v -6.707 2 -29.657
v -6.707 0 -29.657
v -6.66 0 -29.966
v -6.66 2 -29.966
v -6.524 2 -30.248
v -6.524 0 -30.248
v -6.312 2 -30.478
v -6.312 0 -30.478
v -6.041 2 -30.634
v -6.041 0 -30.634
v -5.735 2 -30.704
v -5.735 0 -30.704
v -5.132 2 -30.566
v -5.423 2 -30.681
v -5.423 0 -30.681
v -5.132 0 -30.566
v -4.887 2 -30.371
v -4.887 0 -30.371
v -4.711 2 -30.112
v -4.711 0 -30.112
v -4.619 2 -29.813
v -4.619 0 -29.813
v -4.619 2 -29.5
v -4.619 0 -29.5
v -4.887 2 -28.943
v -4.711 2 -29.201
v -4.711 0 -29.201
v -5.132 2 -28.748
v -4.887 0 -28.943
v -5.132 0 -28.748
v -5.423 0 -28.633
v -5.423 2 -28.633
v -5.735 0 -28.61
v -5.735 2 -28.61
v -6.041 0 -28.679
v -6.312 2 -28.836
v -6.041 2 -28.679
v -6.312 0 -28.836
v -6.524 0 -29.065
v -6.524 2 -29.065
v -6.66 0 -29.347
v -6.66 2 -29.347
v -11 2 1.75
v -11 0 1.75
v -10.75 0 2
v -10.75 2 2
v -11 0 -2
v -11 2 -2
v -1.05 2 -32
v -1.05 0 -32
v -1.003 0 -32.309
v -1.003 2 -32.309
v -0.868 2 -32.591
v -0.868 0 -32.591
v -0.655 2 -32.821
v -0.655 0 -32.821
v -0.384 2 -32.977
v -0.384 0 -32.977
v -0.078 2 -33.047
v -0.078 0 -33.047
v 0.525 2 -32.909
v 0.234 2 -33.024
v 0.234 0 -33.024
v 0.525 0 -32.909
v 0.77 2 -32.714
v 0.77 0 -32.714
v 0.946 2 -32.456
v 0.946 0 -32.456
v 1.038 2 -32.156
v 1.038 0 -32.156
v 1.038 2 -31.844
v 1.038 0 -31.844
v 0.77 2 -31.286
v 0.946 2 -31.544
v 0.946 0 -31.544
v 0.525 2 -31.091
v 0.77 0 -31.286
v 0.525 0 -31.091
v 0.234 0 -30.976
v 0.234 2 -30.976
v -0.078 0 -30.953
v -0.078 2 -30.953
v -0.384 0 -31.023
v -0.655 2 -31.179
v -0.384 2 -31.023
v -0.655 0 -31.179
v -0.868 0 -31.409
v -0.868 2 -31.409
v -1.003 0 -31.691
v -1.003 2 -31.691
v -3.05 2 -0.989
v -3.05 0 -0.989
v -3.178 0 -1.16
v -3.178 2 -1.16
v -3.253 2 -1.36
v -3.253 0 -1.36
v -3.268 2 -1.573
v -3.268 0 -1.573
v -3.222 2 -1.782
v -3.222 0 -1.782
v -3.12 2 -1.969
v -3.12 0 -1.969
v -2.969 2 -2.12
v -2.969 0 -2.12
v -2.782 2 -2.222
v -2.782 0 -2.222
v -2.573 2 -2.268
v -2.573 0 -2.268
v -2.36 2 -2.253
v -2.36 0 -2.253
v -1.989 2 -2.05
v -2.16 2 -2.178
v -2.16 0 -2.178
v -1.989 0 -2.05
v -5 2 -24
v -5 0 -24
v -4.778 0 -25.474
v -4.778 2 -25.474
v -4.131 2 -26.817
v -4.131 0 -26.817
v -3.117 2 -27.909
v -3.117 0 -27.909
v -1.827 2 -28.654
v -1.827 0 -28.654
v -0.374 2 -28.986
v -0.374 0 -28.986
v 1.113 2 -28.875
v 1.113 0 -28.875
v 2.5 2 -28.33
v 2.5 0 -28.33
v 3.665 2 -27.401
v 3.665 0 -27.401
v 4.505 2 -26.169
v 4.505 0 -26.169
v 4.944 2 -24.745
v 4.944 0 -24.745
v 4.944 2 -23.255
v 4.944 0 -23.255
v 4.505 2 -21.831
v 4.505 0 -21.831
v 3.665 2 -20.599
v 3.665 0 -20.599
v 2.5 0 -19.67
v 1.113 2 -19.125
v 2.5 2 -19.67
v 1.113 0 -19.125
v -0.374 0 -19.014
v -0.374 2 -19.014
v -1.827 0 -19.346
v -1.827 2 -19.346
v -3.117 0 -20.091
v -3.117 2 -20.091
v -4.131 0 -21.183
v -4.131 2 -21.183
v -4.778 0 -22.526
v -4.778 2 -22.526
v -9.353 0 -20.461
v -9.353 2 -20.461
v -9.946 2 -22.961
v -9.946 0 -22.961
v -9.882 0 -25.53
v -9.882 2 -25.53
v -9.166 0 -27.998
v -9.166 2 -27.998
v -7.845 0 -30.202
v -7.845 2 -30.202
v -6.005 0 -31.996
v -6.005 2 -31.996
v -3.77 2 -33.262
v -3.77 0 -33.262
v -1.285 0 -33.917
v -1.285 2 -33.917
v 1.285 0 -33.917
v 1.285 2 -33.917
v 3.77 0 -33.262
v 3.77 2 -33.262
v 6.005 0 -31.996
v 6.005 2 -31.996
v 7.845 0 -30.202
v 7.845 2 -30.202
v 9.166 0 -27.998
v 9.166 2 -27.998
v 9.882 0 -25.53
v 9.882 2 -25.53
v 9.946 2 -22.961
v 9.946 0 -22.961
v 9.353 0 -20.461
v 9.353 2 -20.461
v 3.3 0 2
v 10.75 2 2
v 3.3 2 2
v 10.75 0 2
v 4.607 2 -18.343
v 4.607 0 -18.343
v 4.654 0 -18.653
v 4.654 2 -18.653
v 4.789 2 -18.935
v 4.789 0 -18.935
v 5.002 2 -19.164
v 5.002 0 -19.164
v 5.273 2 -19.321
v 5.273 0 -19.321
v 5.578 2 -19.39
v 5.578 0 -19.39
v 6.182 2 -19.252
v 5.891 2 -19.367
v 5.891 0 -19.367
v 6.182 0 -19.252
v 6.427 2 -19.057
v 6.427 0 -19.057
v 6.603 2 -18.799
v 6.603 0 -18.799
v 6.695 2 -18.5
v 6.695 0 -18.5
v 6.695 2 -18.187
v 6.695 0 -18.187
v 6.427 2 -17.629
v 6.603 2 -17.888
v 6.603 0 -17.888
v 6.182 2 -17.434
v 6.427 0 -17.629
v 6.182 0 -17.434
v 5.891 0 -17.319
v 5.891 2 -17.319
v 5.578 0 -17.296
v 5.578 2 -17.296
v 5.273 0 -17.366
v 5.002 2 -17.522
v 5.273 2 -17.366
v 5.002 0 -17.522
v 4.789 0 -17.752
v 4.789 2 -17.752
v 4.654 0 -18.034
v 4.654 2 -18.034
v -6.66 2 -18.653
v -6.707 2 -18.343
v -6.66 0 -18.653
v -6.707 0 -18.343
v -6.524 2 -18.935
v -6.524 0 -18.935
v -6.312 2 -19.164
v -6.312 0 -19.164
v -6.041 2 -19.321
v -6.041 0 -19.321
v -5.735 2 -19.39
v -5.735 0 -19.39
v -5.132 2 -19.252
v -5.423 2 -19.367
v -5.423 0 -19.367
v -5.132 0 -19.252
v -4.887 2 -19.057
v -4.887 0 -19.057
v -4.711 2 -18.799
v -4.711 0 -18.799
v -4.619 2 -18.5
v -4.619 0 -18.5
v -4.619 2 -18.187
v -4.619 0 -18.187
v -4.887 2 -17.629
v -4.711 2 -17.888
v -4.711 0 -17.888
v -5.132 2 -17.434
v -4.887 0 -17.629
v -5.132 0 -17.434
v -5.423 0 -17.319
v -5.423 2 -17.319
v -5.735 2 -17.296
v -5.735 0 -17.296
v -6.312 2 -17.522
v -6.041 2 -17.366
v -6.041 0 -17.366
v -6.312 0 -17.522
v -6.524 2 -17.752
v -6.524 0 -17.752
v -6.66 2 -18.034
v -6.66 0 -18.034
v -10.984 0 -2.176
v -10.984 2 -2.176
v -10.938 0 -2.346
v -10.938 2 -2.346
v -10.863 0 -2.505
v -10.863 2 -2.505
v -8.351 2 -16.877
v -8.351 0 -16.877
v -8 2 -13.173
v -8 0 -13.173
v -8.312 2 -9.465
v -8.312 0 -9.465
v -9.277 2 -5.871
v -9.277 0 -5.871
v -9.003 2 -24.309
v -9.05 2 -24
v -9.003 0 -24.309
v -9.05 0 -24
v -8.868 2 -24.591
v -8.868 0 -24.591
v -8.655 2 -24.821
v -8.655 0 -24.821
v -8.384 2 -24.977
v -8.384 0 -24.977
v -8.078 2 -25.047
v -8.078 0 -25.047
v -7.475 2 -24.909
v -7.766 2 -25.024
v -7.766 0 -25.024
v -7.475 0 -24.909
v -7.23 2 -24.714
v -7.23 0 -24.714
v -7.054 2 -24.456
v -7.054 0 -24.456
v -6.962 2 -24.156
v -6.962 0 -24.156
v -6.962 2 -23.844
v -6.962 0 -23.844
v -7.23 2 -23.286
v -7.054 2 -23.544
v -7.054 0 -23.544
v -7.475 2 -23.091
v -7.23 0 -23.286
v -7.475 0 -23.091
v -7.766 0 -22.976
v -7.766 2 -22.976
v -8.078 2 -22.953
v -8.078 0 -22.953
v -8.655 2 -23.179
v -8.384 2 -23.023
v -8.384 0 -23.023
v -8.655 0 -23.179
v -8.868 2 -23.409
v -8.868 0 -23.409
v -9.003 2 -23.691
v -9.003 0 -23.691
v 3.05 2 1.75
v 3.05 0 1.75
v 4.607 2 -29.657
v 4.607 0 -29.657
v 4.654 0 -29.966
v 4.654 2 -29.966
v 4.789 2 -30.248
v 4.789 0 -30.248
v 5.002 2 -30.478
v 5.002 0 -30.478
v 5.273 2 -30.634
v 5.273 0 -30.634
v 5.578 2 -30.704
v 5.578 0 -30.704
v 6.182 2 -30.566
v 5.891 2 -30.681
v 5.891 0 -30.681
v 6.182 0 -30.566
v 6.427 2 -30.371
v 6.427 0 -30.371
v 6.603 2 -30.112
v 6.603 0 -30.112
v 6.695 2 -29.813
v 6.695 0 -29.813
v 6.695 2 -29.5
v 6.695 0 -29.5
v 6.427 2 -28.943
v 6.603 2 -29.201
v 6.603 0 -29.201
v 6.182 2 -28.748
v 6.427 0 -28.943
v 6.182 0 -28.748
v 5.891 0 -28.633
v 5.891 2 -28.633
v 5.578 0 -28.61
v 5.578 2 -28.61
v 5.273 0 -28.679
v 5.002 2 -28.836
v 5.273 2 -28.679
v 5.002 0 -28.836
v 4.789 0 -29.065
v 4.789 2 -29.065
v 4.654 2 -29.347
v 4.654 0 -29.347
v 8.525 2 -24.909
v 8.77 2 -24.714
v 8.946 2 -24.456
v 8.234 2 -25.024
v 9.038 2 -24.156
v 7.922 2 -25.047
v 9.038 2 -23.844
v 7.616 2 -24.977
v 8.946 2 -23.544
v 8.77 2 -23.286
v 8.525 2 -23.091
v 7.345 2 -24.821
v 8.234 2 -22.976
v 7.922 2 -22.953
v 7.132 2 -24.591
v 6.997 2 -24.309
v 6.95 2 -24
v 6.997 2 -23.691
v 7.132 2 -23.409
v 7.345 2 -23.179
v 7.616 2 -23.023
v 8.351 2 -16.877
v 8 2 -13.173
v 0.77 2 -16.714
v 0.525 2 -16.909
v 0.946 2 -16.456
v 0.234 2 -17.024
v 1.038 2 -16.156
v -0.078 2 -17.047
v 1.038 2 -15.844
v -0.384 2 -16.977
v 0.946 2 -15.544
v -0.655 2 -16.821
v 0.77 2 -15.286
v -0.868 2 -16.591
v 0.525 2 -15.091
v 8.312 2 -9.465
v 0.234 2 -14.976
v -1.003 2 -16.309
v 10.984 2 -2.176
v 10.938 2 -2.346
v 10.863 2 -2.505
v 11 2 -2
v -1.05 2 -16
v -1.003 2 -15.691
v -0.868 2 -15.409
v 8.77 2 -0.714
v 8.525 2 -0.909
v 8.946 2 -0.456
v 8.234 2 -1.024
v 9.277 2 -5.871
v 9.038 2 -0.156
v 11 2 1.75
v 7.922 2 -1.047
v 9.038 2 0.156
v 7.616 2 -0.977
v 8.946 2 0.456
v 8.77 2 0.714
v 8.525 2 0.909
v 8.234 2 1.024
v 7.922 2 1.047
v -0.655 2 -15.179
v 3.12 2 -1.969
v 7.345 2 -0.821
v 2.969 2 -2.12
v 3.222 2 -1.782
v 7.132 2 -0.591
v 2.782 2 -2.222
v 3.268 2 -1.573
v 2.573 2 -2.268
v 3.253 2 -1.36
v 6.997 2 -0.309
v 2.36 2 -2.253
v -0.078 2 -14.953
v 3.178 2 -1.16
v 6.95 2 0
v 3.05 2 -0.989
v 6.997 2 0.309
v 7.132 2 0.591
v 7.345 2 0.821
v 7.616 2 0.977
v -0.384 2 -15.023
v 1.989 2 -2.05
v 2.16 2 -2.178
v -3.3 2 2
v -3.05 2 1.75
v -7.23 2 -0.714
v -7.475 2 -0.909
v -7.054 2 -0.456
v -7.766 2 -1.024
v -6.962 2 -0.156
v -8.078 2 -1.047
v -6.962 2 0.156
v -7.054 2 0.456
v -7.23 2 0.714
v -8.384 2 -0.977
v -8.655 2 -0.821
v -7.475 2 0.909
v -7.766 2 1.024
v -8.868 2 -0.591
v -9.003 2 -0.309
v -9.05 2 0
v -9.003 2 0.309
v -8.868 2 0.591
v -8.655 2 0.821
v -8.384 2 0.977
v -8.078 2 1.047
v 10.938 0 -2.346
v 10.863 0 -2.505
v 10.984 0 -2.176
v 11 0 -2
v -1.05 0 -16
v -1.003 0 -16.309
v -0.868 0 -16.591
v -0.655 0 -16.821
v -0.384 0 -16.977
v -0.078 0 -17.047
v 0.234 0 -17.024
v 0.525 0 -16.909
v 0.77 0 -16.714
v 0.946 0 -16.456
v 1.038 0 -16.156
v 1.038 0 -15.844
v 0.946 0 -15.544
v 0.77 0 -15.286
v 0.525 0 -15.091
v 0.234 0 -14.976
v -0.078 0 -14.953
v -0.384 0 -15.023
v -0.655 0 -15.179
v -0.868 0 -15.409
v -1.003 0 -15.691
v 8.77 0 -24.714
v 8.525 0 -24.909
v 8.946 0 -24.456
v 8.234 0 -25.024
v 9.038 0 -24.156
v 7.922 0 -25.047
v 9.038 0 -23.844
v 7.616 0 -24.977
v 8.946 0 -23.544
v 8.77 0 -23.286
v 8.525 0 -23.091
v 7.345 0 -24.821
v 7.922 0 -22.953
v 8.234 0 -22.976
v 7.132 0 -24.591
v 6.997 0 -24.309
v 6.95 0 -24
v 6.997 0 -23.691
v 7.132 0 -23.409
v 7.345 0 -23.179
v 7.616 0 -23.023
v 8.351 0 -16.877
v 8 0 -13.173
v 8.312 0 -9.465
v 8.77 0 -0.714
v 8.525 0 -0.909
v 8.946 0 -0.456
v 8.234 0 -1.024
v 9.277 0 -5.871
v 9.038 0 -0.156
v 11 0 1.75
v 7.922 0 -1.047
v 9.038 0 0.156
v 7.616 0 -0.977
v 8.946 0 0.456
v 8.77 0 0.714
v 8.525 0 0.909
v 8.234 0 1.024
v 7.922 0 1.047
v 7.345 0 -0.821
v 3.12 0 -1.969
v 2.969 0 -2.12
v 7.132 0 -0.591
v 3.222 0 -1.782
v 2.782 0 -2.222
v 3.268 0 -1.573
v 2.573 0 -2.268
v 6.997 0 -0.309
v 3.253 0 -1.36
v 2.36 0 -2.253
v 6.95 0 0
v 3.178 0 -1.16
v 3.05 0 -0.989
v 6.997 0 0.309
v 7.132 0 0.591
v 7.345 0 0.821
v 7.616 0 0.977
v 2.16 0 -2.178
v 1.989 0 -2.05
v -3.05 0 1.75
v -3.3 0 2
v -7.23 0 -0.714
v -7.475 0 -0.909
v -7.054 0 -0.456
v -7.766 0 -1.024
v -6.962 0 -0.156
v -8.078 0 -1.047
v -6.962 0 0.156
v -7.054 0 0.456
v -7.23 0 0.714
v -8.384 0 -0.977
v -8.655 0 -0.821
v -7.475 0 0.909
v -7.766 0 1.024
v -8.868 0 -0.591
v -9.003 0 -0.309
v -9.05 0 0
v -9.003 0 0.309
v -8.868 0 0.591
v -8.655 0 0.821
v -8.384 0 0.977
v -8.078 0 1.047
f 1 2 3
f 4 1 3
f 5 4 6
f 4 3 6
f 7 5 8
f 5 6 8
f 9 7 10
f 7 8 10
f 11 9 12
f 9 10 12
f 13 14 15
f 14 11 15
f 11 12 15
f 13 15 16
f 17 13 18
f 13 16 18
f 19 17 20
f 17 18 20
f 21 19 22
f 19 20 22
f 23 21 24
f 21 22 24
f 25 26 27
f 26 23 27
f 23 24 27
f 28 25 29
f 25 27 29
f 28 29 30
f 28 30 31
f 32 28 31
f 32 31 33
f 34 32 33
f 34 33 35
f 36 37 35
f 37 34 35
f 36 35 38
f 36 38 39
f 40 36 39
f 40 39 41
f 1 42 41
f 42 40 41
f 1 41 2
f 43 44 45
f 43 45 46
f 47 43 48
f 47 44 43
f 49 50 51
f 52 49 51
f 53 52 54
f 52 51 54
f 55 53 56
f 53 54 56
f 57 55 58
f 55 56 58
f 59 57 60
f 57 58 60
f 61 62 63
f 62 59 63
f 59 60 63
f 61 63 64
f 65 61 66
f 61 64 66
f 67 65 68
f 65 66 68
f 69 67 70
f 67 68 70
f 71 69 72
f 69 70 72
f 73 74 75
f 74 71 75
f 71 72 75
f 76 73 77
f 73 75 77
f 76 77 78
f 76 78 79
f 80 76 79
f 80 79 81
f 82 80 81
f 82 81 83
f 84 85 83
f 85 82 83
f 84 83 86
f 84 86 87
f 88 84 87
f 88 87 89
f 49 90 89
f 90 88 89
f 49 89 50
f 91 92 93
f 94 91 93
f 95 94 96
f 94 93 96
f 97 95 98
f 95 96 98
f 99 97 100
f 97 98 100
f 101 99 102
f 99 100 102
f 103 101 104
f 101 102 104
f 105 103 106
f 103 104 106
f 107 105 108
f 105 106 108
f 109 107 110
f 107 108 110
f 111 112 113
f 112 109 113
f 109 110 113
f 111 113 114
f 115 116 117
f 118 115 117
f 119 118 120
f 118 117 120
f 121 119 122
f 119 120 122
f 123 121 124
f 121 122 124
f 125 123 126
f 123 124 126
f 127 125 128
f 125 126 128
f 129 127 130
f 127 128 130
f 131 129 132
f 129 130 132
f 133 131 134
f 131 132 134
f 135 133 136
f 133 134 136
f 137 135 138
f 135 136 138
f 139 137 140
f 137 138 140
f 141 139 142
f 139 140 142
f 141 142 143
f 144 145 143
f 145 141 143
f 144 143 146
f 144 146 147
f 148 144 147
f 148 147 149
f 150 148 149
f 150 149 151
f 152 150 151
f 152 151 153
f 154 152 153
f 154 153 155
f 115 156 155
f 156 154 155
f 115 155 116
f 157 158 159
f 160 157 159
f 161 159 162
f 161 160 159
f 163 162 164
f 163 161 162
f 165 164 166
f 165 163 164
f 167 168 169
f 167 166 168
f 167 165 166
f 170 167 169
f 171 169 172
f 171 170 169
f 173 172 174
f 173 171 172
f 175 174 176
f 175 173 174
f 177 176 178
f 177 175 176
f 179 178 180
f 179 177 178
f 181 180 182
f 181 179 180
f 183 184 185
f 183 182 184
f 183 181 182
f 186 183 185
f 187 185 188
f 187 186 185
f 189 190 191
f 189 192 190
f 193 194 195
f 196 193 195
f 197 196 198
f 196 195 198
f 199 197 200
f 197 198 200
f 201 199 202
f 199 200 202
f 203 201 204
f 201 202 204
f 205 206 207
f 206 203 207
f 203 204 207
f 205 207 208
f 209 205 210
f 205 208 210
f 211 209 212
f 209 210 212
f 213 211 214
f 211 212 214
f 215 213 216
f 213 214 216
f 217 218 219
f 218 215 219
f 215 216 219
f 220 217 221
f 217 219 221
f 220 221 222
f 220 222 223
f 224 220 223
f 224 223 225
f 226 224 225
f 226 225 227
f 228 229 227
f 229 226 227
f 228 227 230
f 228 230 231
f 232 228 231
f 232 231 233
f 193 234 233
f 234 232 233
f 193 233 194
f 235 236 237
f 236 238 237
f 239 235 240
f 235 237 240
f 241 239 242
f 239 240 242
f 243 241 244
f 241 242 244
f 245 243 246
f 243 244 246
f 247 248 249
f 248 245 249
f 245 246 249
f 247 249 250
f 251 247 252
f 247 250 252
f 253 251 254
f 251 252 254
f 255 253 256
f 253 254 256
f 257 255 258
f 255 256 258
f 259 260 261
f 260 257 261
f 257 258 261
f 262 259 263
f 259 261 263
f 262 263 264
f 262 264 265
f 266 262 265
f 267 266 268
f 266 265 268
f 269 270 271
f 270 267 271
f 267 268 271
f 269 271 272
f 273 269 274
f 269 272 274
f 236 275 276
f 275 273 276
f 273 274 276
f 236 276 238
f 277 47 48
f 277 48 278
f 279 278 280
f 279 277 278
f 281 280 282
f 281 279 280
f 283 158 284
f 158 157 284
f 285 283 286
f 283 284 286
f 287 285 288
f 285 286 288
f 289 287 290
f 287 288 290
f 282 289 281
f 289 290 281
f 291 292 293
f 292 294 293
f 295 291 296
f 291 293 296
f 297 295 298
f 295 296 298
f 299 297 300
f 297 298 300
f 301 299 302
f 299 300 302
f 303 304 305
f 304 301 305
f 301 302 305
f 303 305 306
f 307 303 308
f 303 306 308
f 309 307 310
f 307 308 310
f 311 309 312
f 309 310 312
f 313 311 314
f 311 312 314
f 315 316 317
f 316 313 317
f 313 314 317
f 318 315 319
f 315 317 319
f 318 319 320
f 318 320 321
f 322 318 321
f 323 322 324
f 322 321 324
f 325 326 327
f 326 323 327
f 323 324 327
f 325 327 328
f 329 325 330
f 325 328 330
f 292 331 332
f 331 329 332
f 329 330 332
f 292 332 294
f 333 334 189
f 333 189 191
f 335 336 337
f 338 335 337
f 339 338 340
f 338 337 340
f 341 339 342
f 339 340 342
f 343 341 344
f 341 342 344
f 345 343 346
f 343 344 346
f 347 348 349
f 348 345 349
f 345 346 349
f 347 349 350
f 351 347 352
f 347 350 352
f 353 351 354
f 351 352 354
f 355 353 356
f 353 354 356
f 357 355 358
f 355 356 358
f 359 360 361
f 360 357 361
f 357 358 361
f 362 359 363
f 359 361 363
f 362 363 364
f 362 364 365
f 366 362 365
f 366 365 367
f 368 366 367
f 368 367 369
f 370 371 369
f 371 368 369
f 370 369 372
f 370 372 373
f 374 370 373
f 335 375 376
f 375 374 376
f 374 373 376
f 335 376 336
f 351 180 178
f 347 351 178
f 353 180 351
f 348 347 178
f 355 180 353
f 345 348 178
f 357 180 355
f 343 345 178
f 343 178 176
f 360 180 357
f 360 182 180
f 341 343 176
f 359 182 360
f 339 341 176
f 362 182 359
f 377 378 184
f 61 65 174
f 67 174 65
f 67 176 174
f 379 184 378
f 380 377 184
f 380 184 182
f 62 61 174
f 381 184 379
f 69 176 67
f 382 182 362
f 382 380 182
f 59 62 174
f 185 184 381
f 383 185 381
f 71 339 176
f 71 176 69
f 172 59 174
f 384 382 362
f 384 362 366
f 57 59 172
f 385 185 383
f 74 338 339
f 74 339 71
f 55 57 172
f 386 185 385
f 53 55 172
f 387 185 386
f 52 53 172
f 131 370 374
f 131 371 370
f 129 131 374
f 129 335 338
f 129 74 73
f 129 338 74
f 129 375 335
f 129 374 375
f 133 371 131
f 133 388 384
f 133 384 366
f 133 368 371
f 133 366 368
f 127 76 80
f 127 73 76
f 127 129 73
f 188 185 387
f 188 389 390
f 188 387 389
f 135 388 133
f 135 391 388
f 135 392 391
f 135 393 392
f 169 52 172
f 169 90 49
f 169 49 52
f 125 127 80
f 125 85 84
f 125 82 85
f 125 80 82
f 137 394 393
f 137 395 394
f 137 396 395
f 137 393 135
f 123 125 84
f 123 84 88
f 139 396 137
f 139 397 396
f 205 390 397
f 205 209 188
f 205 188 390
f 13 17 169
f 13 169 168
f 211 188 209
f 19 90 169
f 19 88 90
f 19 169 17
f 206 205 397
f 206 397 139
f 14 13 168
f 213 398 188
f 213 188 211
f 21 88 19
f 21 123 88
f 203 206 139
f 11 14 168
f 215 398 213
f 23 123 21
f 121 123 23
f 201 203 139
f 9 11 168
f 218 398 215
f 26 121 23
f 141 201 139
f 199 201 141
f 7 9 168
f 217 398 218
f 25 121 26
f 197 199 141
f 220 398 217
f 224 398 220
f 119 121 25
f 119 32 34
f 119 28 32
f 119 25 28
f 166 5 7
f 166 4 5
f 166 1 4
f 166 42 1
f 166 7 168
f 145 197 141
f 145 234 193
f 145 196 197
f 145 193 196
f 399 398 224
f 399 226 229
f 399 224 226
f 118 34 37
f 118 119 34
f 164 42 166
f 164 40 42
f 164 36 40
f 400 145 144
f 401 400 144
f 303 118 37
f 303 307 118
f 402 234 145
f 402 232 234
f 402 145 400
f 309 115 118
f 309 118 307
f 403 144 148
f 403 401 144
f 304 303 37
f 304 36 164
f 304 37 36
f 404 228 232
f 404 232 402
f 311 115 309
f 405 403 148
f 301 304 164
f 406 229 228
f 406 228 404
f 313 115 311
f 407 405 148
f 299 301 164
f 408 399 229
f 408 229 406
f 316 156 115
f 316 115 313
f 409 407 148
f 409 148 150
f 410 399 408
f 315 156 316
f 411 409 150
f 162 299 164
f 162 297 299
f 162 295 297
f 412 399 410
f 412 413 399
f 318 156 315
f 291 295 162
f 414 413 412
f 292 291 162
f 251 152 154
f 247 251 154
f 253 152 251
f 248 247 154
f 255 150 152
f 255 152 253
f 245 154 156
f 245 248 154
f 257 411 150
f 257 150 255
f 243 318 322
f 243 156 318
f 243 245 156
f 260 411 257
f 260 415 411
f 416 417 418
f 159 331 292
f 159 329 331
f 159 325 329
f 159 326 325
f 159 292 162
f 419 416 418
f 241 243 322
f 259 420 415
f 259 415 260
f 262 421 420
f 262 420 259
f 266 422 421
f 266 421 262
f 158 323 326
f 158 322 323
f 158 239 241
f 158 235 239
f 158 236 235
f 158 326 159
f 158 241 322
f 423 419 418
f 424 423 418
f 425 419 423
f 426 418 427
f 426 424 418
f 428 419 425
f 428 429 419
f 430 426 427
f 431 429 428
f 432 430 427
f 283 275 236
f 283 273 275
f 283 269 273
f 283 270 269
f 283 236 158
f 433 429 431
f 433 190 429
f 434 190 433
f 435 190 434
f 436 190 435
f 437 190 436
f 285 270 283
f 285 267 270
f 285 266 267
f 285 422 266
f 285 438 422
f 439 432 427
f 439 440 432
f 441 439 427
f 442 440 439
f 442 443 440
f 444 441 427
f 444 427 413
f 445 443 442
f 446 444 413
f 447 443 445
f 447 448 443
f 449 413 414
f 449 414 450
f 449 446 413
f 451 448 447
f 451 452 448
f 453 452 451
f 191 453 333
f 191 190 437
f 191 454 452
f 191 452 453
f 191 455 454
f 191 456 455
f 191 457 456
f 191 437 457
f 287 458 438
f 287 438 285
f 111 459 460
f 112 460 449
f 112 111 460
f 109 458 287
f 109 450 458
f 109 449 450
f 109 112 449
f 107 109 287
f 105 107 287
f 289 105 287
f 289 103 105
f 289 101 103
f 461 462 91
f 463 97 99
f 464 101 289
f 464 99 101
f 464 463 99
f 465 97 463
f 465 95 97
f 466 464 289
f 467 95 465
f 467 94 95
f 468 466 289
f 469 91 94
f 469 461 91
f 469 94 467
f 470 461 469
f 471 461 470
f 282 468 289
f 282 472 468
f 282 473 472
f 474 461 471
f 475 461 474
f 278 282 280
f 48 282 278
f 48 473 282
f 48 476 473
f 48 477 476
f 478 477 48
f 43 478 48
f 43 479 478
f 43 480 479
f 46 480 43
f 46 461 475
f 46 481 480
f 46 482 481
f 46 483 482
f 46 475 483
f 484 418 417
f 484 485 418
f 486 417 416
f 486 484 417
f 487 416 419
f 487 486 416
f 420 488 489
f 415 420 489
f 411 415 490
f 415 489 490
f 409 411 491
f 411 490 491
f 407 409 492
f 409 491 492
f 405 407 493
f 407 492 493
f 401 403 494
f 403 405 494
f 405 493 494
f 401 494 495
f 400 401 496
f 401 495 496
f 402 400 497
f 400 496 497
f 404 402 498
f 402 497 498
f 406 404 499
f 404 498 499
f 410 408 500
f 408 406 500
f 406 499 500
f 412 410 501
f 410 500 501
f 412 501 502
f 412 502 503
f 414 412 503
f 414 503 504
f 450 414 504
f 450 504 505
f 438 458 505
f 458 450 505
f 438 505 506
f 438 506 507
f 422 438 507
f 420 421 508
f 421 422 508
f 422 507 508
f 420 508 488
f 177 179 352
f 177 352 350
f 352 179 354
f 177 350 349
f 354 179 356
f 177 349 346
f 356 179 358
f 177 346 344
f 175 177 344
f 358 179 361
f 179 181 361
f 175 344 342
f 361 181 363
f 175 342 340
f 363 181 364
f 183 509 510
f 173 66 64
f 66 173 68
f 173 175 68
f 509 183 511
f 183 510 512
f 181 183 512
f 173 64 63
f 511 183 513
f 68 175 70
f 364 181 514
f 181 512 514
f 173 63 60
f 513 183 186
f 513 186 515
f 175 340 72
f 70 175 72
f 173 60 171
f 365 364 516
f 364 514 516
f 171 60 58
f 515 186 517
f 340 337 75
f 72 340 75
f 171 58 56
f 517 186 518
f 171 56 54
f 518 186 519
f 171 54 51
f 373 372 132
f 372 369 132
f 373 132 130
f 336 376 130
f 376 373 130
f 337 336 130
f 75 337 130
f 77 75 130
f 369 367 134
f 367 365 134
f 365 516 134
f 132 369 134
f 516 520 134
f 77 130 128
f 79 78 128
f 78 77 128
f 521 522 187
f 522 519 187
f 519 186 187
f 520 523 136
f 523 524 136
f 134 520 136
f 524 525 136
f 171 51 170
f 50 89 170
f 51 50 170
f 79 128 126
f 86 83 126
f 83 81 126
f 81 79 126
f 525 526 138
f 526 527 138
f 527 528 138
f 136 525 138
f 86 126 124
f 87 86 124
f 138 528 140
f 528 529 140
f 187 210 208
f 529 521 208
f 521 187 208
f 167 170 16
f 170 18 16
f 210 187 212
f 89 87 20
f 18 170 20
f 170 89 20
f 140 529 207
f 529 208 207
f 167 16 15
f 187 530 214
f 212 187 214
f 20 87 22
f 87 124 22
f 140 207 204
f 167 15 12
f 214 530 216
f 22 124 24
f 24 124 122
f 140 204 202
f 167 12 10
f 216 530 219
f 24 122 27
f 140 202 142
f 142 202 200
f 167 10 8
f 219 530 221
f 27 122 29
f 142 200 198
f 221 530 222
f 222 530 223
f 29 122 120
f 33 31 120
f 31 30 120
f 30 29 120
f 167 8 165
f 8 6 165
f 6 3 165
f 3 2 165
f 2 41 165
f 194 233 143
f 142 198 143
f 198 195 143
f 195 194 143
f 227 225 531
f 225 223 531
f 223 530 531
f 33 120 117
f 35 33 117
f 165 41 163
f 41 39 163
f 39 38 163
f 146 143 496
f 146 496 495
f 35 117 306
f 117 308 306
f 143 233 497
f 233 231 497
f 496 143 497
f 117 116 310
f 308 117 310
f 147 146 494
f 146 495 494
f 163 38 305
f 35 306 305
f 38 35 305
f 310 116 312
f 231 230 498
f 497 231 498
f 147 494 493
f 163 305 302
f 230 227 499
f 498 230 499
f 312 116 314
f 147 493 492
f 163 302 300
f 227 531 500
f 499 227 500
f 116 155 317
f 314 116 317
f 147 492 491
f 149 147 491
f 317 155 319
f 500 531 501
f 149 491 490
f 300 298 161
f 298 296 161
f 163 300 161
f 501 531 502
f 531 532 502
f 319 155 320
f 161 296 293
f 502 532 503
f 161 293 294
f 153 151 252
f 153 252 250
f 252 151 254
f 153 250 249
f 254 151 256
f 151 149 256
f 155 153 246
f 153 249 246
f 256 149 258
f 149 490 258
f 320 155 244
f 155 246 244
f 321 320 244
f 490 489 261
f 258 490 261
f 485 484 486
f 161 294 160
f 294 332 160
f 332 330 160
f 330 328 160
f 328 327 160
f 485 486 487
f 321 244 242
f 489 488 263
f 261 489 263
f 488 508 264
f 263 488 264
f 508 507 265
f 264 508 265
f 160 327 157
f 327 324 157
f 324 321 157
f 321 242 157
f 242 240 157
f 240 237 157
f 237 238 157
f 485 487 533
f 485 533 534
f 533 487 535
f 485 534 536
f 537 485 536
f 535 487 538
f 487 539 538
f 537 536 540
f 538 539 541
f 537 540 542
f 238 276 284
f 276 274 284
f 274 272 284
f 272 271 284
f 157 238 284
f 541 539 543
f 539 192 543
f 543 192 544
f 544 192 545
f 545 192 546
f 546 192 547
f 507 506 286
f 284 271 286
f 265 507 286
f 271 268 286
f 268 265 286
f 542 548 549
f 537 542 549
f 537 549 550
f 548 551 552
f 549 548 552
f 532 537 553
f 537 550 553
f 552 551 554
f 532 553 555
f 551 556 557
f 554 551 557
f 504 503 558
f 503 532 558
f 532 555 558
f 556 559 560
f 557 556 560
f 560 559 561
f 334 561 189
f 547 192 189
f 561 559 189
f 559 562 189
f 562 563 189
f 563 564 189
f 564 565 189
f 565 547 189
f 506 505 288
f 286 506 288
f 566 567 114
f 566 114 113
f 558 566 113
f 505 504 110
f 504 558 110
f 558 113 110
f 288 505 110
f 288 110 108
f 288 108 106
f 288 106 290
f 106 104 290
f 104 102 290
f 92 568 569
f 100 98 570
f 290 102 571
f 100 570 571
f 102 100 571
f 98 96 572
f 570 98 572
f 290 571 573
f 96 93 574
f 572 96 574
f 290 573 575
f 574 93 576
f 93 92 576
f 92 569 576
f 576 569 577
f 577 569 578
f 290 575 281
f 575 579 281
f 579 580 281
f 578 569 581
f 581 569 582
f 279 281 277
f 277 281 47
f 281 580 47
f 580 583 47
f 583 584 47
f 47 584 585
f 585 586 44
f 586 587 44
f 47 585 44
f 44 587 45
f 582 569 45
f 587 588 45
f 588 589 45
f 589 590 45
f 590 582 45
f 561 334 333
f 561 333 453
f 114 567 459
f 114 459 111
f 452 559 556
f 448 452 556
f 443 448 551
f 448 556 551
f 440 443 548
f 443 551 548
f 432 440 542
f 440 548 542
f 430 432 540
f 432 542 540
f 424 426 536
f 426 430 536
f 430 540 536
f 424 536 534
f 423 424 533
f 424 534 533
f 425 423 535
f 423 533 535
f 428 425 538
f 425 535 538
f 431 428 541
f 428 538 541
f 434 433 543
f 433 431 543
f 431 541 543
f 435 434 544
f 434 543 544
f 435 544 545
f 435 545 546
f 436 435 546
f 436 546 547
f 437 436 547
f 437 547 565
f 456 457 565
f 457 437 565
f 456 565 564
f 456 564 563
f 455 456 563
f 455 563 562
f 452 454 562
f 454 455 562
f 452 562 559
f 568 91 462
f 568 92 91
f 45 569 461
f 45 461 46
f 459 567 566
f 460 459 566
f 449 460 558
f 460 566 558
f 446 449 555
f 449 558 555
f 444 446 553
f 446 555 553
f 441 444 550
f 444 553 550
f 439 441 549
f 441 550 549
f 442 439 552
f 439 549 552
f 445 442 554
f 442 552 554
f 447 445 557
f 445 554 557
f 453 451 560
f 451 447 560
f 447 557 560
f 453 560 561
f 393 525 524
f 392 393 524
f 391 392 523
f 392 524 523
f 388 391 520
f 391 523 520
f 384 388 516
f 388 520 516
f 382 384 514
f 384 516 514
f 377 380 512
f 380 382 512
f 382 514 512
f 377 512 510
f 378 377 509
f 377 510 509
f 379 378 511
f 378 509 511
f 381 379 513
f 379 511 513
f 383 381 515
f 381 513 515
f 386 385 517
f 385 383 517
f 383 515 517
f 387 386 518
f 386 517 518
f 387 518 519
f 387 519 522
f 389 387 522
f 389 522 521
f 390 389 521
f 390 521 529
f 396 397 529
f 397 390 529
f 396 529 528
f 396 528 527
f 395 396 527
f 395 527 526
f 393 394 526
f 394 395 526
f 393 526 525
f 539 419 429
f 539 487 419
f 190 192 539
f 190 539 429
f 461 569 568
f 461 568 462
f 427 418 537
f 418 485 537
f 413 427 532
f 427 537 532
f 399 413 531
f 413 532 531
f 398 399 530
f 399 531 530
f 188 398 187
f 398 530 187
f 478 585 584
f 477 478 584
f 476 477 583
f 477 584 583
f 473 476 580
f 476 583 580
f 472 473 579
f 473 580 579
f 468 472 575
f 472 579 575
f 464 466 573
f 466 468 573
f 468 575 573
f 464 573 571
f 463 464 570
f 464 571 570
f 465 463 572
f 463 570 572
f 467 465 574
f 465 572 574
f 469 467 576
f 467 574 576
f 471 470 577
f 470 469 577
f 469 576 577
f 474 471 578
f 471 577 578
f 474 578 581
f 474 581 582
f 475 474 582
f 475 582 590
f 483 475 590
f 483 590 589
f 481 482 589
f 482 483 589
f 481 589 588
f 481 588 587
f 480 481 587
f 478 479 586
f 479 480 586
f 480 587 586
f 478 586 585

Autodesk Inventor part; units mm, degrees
ref_plane "YZ Plane" through (0, 0, 0) normal (1, 0, 0) x (0, 1, 0)
ref_plane "XZ Plane" through (0, 0, 0) normal (0, 1, 0) x (-1, 0, 0)
ref_plane "XY Plane" through (0, 0, 0) normal (0, 0, 1) x (1, 0, 0)
sketch "スケッチ1" plane through (0, 0, 0) normal (0, 1, 0) x (-1, 0, 0)
  line L0 (0, 0) -> (0, -24) construction
  circle A0 centre (0, -24) radius 5
  arc A1 (-9.3528, -20.4608) -> (9.3528, -20.4608) centre (0, -24) ccw
  line L1 (11, -2) -> (-11, -2) construction
  line L2 (-11, -2) -> (-11, 2)
  line L3 (11, 2) -> (11, -2)
  line L4 (11, 0) -> (-11, 0) construction
  circle A2 centre (8, 0) radius 1.05
  circle A3 centre (-8, 0) radius 1.05
  circle A4 centre (0, -24) radius 8 construction
  circle A5 centre (5.6569, -18.3431) radius 1.05
  circle A6 centre (0, -16) radius 1.05
  circle A7 centre (-5.6569, -18.3431) radius 1.05
  circle A8 centre (-8, -24) radius 1.05
  circle A9 centre (-5.6569, -29.6569) radius 1.05
  circle A10 centre (0, -32) radius 1.05
  circle A11 centre (5.6569, -29.6569) radius 1.05
  circle A12 centre (8, -24) radius 1.05
  line L5 (-3.05, 2) -> (-3.05, -0.9893)
  line L6 (-3.05, -2.05) -> (-1.9893, -2.05) construction
  arc A13 (1.9893, -2.05) -> (3.05, -0.9893) centre (2.5197, -1.5197) ccw
  line L7 (3.05, -2.05) -> (2.5197, -1.5197) construction
  line L8 (3.05, -0.9893) -> (3.05, 2)
  arc A14 (-3.05, -0.9893) -> (-1.9893, -2.05) centre (-2.5197, -1.5197) ccw
  line L9 (-3.05, -2.05) -> (-2.5197, -1.5197) construction
  line L10 (-3.05, -0.9893) -> (-3.05, -2.05) construction
  line L11 (-1.9893, -2.05) -> (1.9893, -2.05)
  line L12 (3.05, -0.9893) -> (3.05, -2.05) construction
  line L13 (1.9893, -2.05) -> (3.05, -2.05) construction
  line L14 (-11, 2) -> (-3.05, 2)
  line L15 (3.05, 2) -> (11, 2)
  arc A15 (10.863, -2.5052) -> (11, -2) centre (10, -2) ccw
  arc A16 (10.863, -2.5052) -> (9.3528, -20.4608) centre (28.9008, -13.0637) ccw
  line L16 (8, -6.3971) -> (8, -16.9723) construction
  arc A17 (-11, -2) -> (-10.863, -2.5052) centre (-10, -2) ccw
  arc A18 (-9.3528, -20.4608) -> (-10.863, -2.5052) centre (-28.9008, -13.0637) ccw
  dimension "d18" = 16
  dimension "d0" = 22
  dimension "d1" = 10
  dimension "d2" = 10
  dimension "d5" = 16
  dimension "d6" = 2.1
  dimension "d16" = 360
  dimension "d19" = 2.1
  dimension "d20" = 22
  dimension "d23" = 0.75
  dimension "d26" = 6.1
  dimension "d28" = 45
  dimension "d29" = 0.75
  dimension "d30" = 45
  dimension "d32" = 4
  dimension "d33" = 4.05
  dimension "d34" = 1
  dimension "d35" = 16
extrude "押し出し1" add sketch "スケッチ1" along normal blind 2
chamfer "面取り1" distance 0.25 angle 45 4 edges at (11, 1, 2) (-11, 1, 2) (-3.05, 1, 2) (3.05, 1, 2)
properties part number "16_008_COXA_FRAME_3_R1" material "Aluminum 6061"
